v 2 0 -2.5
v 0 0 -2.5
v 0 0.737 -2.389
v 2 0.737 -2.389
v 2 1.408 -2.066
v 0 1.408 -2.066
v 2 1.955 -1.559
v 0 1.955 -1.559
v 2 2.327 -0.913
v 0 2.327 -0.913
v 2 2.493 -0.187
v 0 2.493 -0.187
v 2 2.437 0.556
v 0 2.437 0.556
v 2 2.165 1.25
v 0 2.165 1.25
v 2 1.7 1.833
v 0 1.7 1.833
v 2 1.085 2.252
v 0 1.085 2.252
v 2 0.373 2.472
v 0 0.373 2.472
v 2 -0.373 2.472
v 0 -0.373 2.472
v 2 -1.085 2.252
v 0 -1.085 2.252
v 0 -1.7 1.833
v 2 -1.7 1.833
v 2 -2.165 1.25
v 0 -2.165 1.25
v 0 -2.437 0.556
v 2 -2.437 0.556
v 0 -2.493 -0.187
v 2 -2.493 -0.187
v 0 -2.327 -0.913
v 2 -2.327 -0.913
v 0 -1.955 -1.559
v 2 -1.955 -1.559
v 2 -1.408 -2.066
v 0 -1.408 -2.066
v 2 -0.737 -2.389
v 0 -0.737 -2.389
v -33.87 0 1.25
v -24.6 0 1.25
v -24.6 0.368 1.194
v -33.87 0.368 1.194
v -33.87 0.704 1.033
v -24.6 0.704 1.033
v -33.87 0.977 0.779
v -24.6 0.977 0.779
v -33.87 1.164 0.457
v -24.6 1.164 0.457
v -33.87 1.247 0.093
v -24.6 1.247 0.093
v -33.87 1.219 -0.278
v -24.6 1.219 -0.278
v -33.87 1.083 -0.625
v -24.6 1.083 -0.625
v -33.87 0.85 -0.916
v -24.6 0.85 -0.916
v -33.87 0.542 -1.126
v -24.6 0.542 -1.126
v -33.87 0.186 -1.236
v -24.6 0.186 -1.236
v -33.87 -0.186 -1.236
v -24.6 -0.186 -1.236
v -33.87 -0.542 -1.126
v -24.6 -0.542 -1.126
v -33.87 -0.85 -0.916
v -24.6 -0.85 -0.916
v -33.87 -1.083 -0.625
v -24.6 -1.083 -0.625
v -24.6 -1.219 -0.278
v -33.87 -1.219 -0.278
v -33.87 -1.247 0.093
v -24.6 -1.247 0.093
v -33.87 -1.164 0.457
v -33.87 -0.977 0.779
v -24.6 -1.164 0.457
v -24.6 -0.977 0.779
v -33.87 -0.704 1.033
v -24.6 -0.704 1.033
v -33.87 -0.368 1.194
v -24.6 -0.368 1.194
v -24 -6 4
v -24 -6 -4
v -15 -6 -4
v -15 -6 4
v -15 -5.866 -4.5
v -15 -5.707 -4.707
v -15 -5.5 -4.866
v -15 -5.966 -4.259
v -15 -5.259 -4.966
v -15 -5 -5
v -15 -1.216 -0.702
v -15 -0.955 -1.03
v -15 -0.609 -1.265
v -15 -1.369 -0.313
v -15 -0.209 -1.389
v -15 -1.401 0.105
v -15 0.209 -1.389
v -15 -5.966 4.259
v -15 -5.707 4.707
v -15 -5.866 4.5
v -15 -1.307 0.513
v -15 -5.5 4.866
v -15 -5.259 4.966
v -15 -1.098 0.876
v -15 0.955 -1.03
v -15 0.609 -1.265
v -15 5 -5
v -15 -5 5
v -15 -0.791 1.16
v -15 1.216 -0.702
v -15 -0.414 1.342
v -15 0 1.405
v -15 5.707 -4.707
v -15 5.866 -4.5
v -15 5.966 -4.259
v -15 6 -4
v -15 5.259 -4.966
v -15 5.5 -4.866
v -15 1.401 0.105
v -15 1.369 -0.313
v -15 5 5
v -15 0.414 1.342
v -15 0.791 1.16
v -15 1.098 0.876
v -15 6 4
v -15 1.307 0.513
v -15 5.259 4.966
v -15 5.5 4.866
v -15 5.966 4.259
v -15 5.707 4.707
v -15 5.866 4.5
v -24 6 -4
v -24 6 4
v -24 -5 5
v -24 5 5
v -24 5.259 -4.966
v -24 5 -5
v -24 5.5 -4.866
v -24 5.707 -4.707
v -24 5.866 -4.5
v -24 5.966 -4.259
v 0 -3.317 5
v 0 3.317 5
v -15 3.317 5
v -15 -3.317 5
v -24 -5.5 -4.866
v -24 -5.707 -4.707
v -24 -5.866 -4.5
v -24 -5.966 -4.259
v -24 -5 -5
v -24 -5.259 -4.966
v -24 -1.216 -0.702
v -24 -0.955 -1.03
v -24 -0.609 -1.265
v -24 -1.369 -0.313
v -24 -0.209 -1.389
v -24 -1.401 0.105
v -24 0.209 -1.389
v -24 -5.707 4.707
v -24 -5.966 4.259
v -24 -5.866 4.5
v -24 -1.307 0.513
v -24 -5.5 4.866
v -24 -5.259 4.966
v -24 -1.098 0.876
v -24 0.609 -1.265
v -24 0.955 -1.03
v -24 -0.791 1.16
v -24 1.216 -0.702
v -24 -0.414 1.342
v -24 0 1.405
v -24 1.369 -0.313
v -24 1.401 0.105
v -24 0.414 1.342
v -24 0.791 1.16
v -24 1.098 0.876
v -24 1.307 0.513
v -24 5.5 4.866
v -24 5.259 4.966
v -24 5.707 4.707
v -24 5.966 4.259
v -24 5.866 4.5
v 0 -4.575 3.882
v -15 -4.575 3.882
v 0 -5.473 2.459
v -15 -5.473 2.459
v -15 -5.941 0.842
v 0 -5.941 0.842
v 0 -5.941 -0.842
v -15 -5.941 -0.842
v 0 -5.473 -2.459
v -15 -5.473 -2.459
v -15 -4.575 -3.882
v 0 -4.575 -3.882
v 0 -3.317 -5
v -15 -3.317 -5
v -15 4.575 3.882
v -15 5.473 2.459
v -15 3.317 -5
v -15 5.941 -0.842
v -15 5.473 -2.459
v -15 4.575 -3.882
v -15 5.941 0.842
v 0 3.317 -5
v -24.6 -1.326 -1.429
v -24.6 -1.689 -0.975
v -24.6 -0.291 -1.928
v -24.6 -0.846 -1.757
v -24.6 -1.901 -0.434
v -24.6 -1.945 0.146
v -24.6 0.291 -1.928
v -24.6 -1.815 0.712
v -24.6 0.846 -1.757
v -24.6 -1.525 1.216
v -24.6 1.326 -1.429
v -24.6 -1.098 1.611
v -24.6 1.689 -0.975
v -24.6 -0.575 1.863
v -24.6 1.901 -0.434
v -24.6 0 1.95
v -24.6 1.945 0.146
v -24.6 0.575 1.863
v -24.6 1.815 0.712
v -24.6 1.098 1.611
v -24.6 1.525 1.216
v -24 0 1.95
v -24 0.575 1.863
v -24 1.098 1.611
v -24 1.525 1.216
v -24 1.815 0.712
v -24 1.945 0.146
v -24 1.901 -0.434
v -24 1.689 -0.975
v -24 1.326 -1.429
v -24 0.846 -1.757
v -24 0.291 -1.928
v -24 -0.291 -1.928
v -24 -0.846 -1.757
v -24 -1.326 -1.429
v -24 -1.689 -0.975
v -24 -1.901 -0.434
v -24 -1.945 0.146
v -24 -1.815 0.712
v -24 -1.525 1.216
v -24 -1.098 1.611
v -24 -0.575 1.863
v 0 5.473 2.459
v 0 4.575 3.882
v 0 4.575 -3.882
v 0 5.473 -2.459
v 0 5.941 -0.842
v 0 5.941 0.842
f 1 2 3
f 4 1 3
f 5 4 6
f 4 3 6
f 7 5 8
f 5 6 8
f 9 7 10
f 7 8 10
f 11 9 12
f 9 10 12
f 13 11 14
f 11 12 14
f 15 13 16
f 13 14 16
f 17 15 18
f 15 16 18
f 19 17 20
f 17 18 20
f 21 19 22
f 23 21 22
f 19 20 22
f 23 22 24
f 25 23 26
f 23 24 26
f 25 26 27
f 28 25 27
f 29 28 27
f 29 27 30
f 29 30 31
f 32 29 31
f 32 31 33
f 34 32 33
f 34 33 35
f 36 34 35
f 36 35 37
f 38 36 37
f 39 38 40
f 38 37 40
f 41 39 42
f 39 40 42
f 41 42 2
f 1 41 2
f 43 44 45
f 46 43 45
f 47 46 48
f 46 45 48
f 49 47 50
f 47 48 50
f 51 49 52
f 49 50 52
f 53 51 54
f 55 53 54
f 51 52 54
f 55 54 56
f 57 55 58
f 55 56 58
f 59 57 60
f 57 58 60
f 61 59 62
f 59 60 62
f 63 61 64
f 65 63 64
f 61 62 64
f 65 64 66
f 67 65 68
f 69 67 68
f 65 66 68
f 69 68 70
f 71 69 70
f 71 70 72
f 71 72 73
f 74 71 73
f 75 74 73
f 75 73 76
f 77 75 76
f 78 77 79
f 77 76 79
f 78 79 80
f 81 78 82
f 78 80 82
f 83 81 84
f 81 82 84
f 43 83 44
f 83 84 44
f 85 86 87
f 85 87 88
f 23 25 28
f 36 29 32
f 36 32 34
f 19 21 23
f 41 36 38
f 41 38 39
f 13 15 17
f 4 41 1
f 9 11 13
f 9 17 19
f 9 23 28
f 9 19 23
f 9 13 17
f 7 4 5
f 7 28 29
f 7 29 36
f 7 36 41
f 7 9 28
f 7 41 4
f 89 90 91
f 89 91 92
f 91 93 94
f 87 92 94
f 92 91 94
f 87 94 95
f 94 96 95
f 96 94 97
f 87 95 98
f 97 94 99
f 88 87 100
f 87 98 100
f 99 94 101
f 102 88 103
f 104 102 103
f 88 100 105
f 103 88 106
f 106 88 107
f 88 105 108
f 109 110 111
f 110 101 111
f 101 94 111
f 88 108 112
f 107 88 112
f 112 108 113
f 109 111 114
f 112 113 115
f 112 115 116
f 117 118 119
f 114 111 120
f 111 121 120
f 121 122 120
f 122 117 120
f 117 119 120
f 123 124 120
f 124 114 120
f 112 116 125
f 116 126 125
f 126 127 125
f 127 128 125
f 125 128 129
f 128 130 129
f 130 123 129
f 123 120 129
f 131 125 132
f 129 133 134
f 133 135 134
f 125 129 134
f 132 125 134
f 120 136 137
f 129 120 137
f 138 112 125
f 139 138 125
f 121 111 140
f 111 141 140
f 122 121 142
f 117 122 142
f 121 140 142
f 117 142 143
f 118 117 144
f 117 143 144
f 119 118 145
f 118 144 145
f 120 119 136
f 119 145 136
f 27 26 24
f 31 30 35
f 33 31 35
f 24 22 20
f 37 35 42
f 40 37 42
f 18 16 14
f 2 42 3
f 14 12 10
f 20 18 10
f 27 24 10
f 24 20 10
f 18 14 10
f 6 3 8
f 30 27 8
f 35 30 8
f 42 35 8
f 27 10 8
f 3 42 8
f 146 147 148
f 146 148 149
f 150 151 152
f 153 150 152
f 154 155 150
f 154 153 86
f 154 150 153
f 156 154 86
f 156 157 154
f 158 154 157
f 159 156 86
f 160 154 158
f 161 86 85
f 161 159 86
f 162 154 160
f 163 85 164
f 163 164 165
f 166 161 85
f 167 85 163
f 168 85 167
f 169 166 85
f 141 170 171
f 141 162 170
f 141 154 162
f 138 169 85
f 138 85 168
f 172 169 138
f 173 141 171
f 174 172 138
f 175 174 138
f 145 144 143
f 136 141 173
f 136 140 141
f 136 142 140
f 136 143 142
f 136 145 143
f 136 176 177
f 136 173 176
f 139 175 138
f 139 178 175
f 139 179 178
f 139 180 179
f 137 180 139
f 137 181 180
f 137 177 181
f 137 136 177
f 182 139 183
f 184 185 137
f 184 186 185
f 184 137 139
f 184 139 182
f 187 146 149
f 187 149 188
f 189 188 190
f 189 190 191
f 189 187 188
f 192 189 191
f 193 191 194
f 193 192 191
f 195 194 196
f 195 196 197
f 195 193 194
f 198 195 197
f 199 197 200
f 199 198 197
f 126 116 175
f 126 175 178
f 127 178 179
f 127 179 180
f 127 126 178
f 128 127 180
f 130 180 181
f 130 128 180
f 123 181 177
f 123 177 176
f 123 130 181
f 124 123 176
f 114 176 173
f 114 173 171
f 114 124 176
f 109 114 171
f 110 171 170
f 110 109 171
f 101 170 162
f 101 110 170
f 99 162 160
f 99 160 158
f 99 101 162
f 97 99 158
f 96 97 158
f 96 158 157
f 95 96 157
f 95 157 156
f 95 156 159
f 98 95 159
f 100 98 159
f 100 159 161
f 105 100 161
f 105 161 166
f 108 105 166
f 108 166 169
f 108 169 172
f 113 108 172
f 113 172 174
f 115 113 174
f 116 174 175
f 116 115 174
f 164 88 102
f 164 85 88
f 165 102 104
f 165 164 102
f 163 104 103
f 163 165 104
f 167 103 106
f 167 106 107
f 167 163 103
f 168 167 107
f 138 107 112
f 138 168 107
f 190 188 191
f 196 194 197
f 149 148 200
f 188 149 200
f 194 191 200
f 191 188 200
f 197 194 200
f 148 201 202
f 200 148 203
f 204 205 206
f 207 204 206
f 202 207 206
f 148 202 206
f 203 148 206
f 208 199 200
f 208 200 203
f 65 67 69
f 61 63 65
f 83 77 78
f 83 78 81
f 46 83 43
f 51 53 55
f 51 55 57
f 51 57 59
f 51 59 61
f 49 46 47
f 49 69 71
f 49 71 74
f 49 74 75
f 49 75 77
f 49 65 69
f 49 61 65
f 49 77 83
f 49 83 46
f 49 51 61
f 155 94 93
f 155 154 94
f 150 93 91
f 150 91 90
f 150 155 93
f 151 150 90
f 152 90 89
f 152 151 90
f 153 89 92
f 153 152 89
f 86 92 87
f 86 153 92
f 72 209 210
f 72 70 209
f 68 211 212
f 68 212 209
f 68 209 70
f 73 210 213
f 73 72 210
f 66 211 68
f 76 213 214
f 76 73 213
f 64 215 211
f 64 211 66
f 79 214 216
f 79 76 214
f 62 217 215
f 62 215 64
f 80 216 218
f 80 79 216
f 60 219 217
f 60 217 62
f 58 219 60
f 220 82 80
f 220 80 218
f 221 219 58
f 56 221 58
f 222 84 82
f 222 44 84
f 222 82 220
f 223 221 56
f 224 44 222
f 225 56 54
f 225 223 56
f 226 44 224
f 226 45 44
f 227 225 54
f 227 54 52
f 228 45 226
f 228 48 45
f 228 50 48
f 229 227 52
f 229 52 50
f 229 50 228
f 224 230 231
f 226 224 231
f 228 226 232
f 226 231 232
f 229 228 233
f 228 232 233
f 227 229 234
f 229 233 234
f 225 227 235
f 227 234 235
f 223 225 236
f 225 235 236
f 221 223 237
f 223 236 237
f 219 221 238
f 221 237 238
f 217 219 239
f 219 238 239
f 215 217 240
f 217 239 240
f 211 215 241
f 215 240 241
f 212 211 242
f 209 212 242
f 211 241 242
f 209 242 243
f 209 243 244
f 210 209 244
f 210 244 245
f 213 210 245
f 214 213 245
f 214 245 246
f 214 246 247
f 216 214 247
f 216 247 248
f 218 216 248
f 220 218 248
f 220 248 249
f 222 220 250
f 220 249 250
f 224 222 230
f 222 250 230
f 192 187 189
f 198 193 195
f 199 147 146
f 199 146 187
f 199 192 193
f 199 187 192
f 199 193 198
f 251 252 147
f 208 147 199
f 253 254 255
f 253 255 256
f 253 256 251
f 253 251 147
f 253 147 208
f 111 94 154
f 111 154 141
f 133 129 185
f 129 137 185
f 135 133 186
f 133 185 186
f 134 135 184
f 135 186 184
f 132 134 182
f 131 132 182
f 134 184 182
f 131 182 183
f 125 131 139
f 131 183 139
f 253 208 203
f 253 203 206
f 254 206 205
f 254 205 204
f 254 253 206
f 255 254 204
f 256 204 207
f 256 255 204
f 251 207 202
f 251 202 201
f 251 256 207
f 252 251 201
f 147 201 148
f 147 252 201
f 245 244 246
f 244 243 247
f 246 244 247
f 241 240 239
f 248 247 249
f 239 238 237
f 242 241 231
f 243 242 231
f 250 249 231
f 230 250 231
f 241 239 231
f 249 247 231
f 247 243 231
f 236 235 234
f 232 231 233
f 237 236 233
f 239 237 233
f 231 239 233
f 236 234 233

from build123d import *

# Parameters (mm, degrees)
EXTRUDE1_DEPTH = 15
SKETCH2_W      = 10
SKETCH2_H      = 12
SKETCH2_R      = 1.404547398
EXTRUDE2_DEPTH = 9
SKETCH3_R      = 2.5
EXTRUDE3_DEPTH = 2
SKETCH4_R      = 1.95
EXTRUDE4_DEPTH = 0.6
SKETCH5_R      = 1.25
EXTRUDE5_DEPTH = 9.27
FILLET1_R      = 1


with BuildPart() as part:
    # Sketch1 → Extrude1 (new body)
    with BuildSketch(Plane(origin=(0, 0, 0), x_dir=(0, 0, -1), z_dir=(1, 0, 0))):
        with BuildLine():
            Line((-5, 3.31662479), (-5, -3.31662479))
            ThreePointArc((-5, -3.31662479), (0, -6), (5, -3.31662479))
            Line((5, -3.31662479), (5, 3.31662479))
            ThreePointArc((5, 3.31662479), (0, 6), (-5, 3.31662479))
        make_face()
    extrude(amount=-EXTRUDE1_DEPTH)


with BuildPart() as body_2:
    # Sketch2 → Extrude2 (new body)
    with BuildSketch(Plane.ZY.offset(15)):
        Rectangle(SKETCH2_W, SKETCH2_H)
        Circle(SKETCH2_R, mode=Mode.SUBTRACT)
    extrude(amount=EXTRUDE2_DEPTH)

    # Fillet1
    fillet1_edges = [body_2.edges().sort_by_distance(p)[0] for p in [
        (-19.5, -6, 5),
        (-19.5, -6, -5),
        (-19.5, 6, -5),
        (-19.5, 6, 5),
    ]]
    fillet(fillet1_edges, radius=FILLET1_R)


with BuildPart() as body_3:
    # Sketch3 → Extrude3 (new body)
    with BuildSketch(Plane(origin=(0, 0, 0), x_dir=(0, 0, -1), z_dir=(1, 0, 0))):
        Circle(SKETCH3_R)
    extrude(amount=EXTRUDE3_DEPTH)


with BuildPart() as body_4:
    # Sketch4 → Extrude4 (new body)
    with BuildSketch(Plane.ZY.offset(24)):
        Circle(SKETCH4_R)
    extrude(amount=EXTRUDE4_DEPTH)

    # Sketch5 → Extrude5 (add)
    with BuildSketch(Plane.ZY.offset(24.6)):
        Circle(SKETCH5_R)
    extrude(amount=EXTRUDE5_DEPTH)


solid = Compound([part.part, body_2.part, body_3.part, body_4.part])
